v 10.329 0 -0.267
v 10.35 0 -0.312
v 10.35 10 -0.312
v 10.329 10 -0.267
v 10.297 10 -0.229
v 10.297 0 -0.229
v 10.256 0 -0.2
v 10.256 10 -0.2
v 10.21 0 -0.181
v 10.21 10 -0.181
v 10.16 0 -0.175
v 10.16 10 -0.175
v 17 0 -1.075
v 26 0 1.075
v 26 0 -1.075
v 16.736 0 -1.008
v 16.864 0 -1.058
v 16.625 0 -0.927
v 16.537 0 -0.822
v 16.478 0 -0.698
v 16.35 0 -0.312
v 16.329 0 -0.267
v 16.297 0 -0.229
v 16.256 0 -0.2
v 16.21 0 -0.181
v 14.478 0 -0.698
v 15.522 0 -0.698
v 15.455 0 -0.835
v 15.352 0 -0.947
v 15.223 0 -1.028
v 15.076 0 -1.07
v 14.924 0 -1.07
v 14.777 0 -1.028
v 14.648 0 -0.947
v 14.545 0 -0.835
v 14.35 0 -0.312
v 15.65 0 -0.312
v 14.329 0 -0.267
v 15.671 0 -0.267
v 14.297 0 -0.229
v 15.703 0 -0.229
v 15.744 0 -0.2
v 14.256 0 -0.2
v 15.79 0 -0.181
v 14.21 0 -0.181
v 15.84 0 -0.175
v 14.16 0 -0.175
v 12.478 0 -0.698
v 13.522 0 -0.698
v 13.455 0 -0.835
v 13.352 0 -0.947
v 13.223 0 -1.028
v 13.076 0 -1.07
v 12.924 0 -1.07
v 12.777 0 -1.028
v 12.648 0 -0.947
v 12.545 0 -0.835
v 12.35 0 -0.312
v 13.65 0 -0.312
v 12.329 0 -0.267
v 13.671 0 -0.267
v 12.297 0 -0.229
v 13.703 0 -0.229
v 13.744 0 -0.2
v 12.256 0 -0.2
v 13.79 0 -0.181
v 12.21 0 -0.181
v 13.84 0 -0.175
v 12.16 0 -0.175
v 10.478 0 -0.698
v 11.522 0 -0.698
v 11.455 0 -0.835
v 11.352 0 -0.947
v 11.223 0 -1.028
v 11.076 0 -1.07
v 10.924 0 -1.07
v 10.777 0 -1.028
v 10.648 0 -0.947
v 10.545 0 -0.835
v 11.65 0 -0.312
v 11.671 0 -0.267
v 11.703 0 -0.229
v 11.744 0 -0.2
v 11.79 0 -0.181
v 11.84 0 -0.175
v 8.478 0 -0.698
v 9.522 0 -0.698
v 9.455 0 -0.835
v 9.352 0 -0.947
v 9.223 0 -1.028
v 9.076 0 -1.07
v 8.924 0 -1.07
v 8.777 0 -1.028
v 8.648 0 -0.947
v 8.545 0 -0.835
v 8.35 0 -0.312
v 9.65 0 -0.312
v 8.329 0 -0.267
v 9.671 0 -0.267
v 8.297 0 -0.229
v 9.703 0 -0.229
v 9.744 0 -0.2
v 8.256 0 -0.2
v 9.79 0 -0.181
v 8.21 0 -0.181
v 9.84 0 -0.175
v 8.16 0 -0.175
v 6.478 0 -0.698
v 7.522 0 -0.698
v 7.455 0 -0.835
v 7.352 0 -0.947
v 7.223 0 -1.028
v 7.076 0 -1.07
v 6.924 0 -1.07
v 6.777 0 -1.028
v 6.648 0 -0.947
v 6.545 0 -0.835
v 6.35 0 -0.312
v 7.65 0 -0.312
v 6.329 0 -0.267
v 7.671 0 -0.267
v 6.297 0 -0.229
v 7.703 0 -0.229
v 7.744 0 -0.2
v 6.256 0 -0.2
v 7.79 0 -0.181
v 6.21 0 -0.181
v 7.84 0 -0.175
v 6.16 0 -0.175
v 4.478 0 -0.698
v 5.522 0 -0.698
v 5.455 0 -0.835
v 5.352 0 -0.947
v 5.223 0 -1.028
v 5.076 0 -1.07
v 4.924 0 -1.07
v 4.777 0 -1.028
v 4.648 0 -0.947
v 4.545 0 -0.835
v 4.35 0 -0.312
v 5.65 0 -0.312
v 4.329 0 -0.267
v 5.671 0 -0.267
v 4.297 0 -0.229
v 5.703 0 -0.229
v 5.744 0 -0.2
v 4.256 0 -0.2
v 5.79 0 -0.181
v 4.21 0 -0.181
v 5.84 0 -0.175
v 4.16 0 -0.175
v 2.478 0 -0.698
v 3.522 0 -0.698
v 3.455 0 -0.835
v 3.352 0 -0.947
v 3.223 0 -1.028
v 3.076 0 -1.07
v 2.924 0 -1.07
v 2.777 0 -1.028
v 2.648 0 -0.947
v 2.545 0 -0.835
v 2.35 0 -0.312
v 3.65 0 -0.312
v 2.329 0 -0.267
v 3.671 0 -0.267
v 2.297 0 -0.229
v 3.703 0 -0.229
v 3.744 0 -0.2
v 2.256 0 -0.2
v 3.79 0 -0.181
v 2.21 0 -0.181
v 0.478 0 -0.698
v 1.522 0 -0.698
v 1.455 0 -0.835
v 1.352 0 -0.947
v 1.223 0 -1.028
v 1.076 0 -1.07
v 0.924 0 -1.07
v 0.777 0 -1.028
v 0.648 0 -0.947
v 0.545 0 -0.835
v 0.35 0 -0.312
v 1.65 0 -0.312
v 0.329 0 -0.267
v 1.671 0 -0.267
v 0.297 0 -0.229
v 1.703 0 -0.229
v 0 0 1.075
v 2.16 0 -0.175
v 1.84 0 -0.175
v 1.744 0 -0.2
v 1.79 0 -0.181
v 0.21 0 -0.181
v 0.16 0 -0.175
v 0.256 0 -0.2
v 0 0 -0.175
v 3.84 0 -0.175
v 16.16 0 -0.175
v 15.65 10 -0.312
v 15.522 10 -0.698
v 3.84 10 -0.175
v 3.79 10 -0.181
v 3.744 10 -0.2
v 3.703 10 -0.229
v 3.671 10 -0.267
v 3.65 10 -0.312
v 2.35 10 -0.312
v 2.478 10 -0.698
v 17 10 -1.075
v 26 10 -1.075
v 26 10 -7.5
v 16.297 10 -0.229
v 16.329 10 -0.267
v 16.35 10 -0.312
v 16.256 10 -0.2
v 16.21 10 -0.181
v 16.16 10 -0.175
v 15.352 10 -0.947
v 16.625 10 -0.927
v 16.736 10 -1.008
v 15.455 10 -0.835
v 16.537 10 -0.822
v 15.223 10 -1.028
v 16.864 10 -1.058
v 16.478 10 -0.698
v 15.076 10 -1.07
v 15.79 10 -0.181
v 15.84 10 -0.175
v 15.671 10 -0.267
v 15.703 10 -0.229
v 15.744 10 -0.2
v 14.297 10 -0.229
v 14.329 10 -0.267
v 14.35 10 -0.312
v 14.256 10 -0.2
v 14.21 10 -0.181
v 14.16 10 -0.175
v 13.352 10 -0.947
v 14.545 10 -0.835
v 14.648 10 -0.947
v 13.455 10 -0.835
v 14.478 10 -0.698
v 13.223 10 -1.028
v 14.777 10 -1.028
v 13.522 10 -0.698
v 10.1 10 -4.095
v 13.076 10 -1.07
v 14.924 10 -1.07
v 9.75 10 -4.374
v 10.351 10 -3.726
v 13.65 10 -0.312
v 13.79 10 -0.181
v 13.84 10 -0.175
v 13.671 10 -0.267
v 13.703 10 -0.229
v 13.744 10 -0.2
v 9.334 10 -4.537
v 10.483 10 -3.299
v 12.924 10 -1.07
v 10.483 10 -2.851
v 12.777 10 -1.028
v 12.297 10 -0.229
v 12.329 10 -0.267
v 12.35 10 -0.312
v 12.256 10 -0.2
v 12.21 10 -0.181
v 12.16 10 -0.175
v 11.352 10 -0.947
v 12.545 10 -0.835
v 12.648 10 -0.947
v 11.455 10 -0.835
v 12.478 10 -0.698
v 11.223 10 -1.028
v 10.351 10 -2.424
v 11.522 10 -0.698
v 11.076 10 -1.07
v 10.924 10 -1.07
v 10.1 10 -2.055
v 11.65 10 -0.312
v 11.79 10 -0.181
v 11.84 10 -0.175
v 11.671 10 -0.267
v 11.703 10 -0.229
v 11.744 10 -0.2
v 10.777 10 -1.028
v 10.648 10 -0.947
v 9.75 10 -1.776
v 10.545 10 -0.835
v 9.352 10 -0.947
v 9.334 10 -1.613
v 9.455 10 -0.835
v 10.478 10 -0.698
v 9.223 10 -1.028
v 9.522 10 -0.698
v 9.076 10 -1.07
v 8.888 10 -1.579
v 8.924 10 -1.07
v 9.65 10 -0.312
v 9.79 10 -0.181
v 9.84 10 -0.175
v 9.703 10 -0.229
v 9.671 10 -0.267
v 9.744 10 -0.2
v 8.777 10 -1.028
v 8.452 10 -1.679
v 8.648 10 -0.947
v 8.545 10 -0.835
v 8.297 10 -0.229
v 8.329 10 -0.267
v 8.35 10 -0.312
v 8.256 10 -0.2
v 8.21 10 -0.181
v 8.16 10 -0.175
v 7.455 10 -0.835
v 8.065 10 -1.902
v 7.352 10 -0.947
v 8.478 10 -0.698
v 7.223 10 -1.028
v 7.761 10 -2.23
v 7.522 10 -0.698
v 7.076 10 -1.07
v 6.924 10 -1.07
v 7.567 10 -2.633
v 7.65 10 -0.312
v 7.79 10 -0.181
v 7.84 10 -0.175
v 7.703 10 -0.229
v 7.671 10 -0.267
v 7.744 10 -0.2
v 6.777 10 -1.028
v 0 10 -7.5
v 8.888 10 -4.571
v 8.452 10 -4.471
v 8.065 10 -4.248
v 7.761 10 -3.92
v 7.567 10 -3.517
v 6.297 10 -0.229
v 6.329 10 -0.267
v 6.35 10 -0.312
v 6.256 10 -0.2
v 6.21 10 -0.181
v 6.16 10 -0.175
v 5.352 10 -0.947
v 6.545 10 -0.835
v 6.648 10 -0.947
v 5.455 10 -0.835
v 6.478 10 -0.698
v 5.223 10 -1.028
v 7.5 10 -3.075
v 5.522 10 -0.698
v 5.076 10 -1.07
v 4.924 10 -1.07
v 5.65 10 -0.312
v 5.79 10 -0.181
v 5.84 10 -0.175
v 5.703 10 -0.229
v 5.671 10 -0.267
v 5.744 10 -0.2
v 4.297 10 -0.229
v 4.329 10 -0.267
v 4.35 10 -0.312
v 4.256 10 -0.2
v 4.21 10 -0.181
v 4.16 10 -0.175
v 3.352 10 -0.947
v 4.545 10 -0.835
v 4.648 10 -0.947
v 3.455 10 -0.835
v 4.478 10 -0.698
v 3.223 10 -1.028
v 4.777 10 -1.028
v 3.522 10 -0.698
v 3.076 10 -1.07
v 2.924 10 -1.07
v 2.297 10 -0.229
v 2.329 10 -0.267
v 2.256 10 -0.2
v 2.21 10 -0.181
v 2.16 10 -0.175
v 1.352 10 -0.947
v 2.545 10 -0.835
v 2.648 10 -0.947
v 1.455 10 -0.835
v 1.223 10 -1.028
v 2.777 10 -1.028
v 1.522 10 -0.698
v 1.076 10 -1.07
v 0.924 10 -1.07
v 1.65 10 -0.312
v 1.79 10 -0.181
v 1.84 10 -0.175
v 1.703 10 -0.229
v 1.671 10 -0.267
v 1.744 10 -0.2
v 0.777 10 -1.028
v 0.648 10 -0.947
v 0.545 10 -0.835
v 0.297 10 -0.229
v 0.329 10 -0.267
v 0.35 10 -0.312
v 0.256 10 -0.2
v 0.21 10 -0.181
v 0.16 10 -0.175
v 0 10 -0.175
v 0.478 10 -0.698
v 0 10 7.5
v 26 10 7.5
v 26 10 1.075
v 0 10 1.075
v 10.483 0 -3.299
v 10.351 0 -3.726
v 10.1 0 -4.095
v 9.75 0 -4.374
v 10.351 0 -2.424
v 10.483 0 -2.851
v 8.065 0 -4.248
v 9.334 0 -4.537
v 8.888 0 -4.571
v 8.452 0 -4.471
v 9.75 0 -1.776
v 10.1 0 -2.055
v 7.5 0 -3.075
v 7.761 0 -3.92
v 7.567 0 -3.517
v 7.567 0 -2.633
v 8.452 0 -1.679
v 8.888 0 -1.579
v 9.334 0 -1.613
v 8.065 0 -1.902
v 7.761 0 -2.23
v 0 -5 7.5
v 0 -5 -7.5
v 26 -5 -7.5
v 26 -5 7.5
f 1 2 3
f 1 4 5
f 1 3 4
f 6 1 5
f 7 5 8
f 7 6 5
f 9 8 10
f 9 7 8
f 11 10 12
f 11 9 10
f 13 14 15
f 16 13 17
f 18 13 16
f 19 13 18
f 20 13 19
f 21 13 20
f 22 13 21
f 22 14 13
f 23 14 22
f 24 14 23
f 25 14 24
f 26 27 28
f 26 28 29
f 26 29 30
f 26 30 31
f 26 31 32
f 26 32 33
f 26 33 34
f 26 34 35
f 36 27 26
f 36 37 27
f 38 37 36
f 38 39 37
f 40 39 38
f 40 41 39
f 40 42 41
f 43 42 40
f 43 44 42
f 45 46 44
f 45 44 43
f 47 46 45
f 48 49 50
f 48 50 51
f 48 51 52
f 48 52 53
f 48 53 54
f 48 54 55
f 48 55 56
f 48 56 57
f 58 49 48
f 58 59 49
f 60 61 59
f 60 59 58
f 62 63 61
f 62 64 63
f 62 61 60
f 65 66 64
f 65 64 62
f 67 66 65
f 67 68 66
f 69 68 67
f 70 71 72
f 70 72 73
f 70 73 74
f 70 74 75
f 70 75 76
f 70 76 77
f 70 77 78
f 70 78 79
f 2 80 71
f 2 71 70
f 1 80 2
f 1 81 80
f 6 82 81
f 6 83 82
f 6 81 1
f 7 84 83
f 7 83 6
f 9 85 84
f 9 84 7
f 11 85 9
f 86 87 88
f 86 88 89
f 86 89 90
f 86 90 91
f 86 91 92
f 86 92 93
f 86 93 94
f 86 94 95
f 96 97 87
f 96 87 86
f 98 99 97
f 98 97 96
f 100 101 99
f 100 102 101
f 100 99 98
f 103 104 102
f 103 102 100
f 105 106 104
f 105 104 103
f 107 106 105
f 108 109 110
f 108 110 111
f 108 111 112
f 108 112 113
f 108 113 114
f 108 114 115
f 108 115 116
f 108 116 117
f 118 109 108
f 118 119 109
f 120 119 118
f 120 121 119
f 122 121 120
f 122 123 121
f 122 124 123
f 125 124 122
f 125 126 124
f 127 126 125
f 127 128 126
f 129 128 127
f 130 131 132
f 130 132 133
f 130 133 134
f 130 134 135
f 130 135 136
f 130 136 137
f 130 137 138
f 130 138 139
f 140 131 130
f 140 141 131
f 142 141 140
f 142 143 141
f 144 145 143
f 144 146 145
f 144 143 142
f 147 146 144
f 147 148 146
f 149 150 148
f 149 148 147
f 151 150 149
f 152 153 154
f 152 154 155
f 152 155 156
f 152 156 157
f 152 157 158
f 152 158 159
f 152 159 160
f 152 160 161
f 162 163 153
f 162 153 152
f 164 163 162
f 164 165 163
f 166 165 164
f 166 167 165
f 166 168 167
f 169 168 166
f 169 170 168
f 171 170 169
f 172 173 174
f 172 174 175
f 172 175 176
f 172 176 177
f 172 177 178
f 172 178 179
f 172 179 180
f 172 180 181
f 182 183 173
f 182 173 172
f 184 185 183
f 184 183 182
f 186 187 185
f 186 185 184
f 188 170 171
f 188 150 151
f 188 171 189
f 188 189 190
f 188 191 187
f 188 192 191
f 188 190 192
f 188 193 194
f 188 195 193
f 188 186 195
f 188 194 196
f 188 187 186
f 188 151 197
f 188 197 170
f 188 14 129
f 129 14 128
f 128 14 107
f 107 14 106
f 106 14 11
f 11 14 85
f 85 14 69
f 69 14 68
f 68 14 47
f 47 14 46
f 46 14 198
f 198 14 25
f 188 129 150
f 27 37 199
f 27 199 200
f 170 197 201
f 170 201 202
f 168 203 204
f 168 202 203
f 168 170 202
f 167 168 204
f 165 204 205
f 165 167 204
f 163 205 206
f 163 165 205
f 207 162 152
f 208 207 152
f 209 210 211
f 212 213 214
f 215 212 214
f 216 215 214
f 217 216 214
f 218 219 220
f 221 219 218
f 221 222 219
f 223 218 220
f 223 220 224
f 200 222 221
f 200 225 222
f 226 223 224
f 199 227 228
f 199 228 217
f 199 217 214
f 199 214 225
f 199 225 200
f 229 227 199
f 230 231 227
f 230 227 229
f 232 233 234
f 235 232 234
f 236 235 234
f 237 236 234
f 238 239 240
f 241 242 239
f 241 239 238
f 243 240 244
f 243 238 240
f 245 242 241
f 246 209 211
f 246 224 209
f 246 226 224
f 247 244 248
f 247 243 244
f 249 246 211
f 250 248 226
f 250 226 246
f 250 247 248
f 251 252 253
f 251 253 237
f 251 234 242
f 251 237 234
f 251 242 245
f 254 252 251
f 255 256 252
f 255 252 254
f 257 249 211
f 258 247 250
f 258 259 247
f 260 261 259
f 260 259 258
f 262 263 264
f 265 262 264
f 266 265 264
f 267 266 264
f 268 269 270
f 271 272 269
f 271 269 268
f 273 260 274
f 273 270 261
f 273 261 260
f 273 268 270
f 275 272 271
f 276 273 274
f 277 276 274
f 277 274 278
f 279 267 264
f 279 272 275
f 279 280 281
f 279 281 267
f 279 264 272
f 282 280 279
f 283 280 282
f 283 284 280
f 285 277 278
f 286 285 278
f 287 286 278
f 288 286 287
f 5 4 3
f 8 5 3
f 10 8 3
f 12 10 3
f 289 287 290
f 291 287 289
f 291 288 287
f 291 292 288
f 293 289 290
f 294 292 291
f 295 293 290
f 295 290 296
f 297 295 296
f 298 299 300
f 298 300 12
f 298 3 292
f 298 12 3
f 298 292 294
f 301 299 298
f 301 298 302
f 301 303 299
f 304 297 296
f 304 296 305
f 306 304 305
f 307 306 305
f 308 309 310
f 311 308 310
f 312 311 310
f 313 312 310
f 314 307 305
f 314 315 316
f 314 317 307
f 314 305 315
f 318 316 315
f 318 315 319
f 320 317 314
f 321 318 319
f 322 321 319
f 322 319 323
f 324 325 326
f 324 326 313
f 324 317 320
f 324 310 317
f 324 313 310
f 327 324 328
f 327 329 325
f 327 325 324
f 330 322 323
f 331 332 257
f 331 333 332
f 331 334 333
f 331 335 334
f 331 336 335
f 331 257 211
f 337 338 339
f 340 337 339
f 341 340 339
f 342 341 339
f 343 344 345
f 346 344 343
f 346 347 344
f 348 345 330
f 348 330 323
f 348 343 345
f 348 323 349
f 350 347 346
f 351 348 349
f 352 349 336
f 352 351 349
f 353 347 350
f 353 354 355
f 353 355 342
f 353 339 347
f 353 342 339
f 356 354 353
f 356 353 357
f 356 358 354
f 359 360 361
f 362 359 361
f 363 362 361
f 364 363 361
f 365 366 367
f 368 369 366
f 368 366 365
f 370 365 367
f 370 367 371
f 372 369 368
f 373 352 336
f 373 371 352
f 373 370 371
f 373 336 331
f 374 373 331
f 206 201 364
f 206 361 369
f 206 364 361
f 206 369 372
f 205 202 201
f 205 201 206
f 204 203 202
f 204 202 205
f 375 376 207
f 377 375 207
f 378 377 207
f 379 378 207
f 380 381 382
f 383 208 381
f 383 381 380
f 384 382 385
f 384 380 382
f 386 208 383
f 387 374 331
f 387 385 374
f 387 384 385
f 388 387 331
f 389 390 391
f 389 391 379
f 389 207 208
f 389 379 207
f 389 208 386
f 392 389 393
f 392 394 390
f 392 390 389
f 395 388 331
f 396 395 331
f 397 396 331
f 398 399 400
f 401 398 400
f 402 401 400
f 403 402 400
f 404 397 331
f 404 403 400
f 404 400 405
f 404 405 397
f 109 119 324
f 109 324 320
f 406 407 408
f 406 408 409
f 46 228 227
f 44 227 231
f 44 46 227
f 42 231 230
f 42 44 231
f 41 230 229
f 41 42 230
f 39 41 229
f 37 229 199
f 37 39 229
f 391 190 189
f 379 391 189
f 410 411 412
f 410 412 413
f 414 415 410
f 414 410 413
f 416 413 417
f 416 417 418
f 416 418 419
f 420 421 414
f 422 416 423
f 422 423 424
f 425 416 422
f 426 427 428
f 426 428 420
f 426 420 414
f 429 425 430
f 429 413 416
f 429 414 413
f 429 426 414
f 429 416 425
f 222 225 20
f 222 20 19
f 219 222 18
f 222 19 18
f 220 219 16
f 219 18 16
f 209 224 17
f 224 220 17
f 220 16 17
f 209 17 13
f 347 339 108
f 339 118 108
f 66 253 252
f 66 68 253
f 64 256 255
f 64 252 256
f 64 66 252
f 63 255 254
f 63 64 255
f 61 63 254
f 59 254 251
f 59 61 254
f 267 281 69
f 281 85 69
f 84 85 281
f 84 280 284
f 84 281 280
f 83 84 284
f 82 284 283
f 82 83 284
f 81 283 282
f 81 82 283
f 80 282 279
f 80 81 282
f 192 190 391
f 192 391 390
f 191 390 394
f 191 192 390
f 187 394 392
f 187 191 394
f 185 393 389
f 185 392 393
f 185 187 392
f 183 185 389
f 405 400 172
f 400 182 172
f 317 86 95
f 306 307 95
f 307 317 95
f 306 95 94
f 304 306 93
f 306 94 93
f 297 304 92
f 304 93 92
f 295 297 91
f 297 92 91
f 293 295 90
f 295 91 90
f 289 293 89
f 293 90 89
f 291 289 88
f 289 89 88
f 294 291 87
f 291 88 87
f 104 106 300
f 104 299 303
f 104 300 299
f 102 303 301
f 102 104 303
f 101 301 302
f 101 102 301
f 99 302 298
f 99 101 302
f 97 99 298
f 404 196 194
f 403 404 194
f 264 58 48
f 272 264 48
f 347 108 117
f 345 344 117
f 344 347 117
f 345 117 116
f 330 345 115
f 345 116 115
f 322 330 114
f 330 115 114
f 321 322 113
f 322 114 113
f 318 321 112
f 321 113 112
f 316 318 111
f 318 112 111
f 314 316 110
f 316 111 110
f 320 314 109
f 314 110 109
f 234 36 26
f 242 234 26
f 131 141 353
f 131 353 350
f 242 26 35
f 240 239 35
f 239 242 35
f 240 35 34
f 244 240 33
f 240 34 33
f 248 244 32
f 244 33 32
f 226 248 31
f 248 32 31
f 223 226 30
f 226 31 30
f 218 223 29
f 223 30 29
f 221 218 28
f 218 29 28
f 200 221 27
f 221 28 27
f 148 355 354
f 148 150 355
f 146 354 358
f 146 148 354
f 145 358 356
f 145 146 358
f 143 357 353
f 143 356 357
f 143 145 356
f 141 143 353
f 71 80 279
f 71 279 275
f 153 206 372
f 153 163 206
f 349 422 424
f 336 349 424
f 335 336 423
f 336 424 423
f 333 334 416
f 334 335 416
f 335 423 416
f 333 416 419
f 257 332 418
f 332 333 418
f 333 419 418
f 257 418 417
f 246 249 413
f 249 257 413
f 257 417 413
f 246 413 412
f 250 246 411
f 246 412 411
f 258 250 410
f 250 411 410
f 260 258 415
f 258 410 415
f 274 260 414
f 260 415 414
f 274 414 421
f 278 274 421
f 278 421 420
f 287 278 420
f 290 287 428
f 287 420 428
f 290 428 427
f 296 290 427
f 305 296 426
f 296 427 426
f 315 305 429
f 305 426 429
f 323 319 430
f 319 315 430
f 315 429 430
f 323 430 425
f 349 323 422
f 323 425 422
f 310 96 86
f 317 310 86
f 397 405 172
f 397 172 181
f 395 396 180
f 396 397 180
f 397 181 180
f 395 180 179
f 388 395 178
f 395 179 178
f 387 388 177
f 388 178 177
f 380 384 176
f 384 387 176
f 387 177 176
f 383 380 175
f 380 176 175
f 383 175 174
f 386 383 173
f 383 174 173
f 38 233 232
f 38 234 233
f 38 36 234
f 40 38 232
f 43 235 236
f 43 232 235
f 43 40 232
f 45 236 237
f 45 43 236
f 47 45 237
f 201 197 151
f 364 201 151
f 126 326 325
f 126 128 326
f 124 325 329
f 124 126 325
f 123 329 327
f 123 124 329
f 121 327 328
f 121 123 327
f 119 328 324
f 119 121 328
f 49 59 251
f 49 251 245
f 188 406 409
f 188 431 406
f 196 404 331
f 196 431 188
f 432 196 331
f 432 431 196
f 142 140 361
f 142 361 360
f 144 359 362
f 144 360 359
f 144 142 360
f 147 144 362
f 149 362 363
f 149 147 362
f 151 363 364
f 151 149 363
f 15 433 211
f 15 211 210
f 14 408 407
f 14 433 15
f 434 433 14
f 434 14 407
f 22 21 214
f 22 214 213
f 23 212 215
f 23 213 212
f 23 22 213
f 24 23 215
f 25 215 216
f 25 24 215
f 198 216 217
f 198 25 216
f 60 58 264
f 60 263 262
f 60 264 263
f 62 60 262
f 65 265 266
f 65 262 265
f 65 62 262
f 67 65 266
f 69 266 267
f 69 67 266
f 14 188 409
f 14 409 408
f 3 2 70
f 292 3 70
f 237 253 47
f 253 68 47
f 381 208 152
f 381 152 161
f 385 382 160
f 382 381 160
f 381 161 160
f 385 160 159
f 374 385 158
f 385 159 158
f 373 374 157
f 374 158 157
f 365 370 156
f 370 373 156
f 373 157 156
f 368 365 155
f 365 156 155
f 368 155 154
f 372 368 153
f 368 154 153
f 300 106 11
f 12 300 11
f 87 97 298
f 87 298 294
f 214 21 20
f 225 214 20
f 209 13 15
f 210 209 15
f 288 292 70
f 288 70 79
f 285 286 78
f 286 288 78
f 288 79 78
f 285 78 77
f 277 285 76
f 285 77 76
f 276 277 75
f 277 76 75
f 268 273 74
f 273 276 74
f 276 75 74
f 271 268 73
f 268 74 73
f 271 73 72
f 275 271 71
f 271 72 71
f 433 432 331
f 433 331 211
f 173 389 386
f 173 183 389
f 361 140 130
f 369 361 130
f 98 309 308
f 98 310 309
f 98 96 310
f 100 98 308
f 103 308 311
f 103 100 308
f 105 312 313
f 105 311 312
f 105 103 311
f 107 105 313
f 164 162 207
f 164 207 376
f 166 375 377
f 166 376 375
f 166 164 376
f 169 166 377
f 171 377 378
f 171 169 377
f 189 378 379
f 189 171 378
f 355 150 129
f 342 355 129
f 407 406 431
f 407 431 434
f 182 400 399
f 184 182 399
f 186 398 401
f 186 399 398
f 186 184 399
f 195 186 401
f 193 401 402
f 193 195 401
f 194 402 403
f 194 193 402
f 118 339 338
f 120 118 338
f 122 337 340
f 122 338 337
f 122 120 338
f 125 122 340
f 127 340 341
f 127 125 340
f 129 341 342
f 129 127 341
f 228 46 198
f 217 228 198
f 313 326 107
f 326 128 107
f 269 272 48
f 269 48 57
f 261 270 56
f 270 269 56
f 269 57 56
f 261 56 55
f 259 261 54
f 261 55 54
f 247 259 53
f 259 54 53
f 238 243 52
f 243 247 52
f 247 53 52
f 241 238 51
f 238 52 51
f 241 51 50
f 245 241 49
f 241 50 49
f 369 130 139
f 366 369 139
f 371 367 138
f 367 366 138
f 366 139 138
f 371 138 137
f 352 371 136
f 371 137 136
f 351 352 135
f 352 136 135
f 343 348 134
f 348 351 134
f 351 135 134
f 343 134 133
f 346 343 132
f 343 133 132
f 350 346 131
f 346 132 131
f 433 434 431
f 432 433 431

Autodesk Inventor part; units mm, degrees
ref_plane "YZ Plane" through (0, 0, 0) normal (1, 0, 0) x (0, 1, 0)
ref_plane "XZ Plane" through (0, 0, 0) normal (0, 1, 0) x (-1, 0, 0)
ref_plane "XY Plane" through (0, 0, 0) normal (0, 0, 1) x (1, 0, 0)
sketch "Sketch1" plane through (0, 0, 0) normal (0, 1, 0) x (-1, 0, 0)
  line L0 (0, 0) -> (0, -1.075)
  line L1 (0, 0) -> (0, 1.075) construction
  line L2 (0, -1.075) -> (-26, -1.075) construction
  line L3 (0, 1.075) -> (-26, 1.075)
  line L4 (0, 1.075) -> (0, 7.5) construction
  line L5 (0, -1.075) -> (0, -7.5) construction
  line L6 (-26, -1.075) -> (-26, 1.075)
  line L7 (0, 1.075) -> (0, 7.5)
  line L8 (0, 7.5) -> (-26, 7.5)
  line L9 (-26, 7.5) -> (-26, 1.075)
  line L10 (0, -7.5) -> (-26, -7.5)
  line L11 (-26, -7.5) -> (-26, -1.075)
  line L12 (1, -0.525) -> (1, 1.075) construction
  arc A0 (-1.5221, -0.698) -> (-0.4779, -0.698) centre (-1, -0.525) ccw
  line L13 (0, -0.175) -> (-0.1602, -0.175)
  line L14 (-0.35, -0.3121) -> (-0.4779, -0.698)
  line L15 (-1, -0.525) -> (1, -0.525) construction
  line L16 (0, -0.525) -> (0, -0.175) construction
  arc A1 (-0.1602, -0.175) -> (-0.35, -0.3121) centre (-0.1602, -0.375) ccw
  line L17 (-1, -0.525) -> (-1, 0) construction
  line L18 (-1, -0.525) -> (-1, 0.025) construction
  line L19 (-2, -0.175) -> (-1.8398, -0.175)
  line L20 (-1.65, -0.3121) -> (-1.5221, -0.698)
  arc A2 (-1.65, -0.3121) -> (-1.8398, -0.175) centre (-1.8398, -0.375) ccw
  line L21 (-2, -0.175) -> (-2.1602, -0.175)
  arc A3 (-2.1602, -0.175) -> (-2.35, -0.3121) centre (-2.1602, -0.375) ccw
  line L22 (-2.35, -0.3121) -> (-2.4779, -0.698)
  arc A4 (-3.5221, -0.698) -> (-2.4779, -0.698) centre (-3, -0.525) ccw
  line L23 (-3.65, -0.3121) -> (-3.5221, -0.698)
  arc A5 (-3.65, -0.3121) -> (-3.8398, -0.175) centre (-3.8398, -0.375) ccw
  line L24 (-4, -0.175) -> (-3.8398, -0.175)
  line L25 (-4, -0.175) -> (-4.1602, -0.175)
  arc A6 (-4.1602, -0.175) -> (-4.35, -0.3121) centre (-4.1602, -0.375) ccw
  line L26 (-4.35, -0.3121) -> (-4.4779, -0.698)
  arc A7 (-5.5221, -0.698) -> (-4.4779, -0.698) centre (-5, -0.525) ccw
  line L27 (-5.65, -0.3121) -> (-5.5221, -0.698)
  arc A8 (-5.65, -0.3121) -> (-5.8398, -0.175) centre (-5.8398, -0.375) ccw
  line L28 (-6, -0.175) -> (-5.8398, -0.175)
  line L29 (-6, -0.175) -> (-6.1602, -0.175)
  arc A9 (-6.1602, -0.175) -> (-6.35, -0.3121) centre (-6.1602, -0.375) ccw
  line L30 (-6.35, -0.3121) -> (-6.4779, -0.698)
  arc A10 (-7.5221, -0.698) -> (-6.4779, -0.698) centre (-7, -0.525) ccw
  line L31 (-7.65, -0.3121) -> (-7.5221, -0.698)
  arc A11 (-7.65, -0.3121) -> (-7.8398, -0.175) centre (-7.8398, -0.375) ccw
  line L32 (-8, -0.175) -> (-7.8398, -0.175)
  line L33 (-8, -0.175) -> (-8.1602, -0.175)
  arc A12 (-8.1602, -0.175) -> (-8.35, -0.3121) centre (-8.1602, -0.375) ccw
  line L34 (-8.35, -0.3121) -> (-8.4779, -0.698)
  arc A13 (-9.5221, -0.698) -> (-8.4779, -0.698) centre (-9, -0.525) ccw
  line L35 (-9.65, -0.3121) -> (-9.5221, -0.698)
  arc A14 (-9.65, -0.3121) -> (-9.8398, -0.175) centre (-9.8398, -0.375) ccw
  line L36 (-10, -0.175) -> (-9.8398, -0.175)
  line L37 (-10, -0.175) -> (-10.1602, -0.175)
  arc A15 (-10.1602, -0.175) -> (-10.35, -0.3121) centre (-10.1602, -0.375) ccw
  line L38 (-10.35, -0.3121) -> (-10.4779, -0.698)
  arc A16 (-11.5221, -0.698) -> (-10.4779, -0.698) centre (-11, -0.525) ccw
  line L39 (-11.65, -0.3121) -> (-11.5221, -0.698)
  arc A17 (-11.65, -0.3121) -> (-11.8398, -0.175) centre (-11.8398, -0.375) ccw
  line L40 (-12, -0.175) -> (-11.8398, -0.175)
  line L41 (-12, -0.175) -> (-12.1602, -0.175)
  arc A18 (-12.1602, -0.175) -> (-12.35, -0.3121) centre (-12.1602, -0.375) ccw
  line L42 (-12.35, -0.3121) -> (-12.4779, -0.698)
  arc A19 (-13.5221, -0.698) -> (-12.4779, -0.698) centre (-13, -0.525) ccw
  line L43 (-13.65, -0.3121) -> (-13.5221, -0.698)
  arc A20 (-13.65, -0.3121) -> (-13.8398, -0.175) centre (-13.8398, -0.375) ccw
  line L44 (-14, -0.175) -> (-13.8398, -0.175)
  line L45 (-14, -0.175) -> (-14.1602, -0.175)
  arc A21 (-14.1602, -0.175) -> (-14.35, -0.3121) centre (-14.1602, -0.375) ccw
  line L46 (-14.35, -0.3121) -> (-14.4779, -0.698)
  arc A22 (-15.5221, -0.698) -> (-14.4779, -0.698) centre (-15, -0.525) ccw
  line L47 (-15.65, -0.3121) -> (-15.5221, -0.698)
  arc A23 (-15.65, -0.3121) -> (-15.8398, -0.175) centre (-15.8398, -0.375) ccw
  line L48 (-16, -0.175) -> (-15.8398, -0.175)
  line L49 (-16, -0.175) -> (-16, -1.075) construction
  circle A24 centre (-9, -3.075) radius 1.5
  line L50 (-16, -1.075) -> (-26, -1.075)
  line L51 (0, -1.075) -> (0, -7.5)
  line L52 (-9, -3.075) -> (-9, -1.075) construction
  arc A25 (-17, -1.075) -> (-16.4779, -0.698) centre (-17, -0.525) ccw
  line L53 (-16.35, -0.3121) -> (-16.4779, -0.698)
  arc A26 (-16.1602, -0.175) -> (-16.35, -0.3121) centre (-16.1602, -0.375) ccw
  line L54 (-16, -0.175) -> (-16.1602, -0.175)
  line L55 (0, 0) -> (0, 1.075)
  point P0 (0, -0.5375)
  point P1 (-0.3046, -0.175)
  point P2 (-2.3046, -0.175)
  point P3 (-4.3046, -0.175)
  point P4 (-6.3046, -0.175)
  point P5 (-8.3046, -0.175)
  point P6 (-10.3046, -0.175)
  point P7 (-12.3046, -0.175)
  point P8 (-14.3046, -0.175)
  point P9 (-17.5221, -0.698)
  dimension "d7" = 26
  dimension "d8" = 15
  dimension "d10" = 1.6
  dimension "d12" = 1.1
  dimension "d13" = 2
  dimension "d14" = 1.25
  dimension "d17" = 0.35
  dimension "d18" = 0.2
  dimension "d21" = 2
  dimension "d26" = 3
  dimension "d28" = 2
  dimension "d29" = 9
extrude "Extrusion2" add sketch "Sketch1" along normal blind 10 contours L0 L51 L10 L11 L50 A25 L53 A26 L54 L48 A23 L47 A22 L46 A21 L45 L44 A20 L43 A19 L42 A18 L41 L40 A17 L39 A16 L38 A15 L37 L36 A14 L35 A13 L34 A12 L33 L32 A11 L31 A10 L30 A9 L29 L28 A8 L27 A7 L26 A6 L25 L24 A5 L23 A4 L22 A3 L21 L19 A2 L20 A0 L14 A1 L13 | L3 L9 L8 L7
extrude "Extrusion3" add sketch "Sketch1" against normal blind 5 contours L0 L13 A1 L14 A0 L20 A2 L19 L21 A3 L22 A4 L23 A5 L24 L25 A6 L26 A7 L27 A8 L28 L29 A9 L30 A10 L31 A11 L32 L33 A12 L34 A13 L35 A14 L36 L37 A15 L38 A16 L39 A17 L40 L41 A18 L42 A19 L43 A20 L44 L45 A21 L46 A22 L47 A23 L48 L54 A26 L53 A25 L50 L6 L3 L55 | L0 L51 L10 L11 L50 A25 L53 A26 L54 L48 A23 L47 A22 L46 A21 L45 L44 A20 L43 A19 L42 A18 L41 L40 A17 L39 A16 L38 A15 L37 L36 A14 L35 A13 L34 A12 L33 L32 A11 L31 A10 L30 A9 L29 L28 A8 L27 A7 L26 A6 L25 L24 A5 L23 A4 L22 A3 L21 L19 A2 L20 A0 L14 A1 L13 | L3 L9 L8 L7 | A24
properties part number "Y Axis Carriage"
